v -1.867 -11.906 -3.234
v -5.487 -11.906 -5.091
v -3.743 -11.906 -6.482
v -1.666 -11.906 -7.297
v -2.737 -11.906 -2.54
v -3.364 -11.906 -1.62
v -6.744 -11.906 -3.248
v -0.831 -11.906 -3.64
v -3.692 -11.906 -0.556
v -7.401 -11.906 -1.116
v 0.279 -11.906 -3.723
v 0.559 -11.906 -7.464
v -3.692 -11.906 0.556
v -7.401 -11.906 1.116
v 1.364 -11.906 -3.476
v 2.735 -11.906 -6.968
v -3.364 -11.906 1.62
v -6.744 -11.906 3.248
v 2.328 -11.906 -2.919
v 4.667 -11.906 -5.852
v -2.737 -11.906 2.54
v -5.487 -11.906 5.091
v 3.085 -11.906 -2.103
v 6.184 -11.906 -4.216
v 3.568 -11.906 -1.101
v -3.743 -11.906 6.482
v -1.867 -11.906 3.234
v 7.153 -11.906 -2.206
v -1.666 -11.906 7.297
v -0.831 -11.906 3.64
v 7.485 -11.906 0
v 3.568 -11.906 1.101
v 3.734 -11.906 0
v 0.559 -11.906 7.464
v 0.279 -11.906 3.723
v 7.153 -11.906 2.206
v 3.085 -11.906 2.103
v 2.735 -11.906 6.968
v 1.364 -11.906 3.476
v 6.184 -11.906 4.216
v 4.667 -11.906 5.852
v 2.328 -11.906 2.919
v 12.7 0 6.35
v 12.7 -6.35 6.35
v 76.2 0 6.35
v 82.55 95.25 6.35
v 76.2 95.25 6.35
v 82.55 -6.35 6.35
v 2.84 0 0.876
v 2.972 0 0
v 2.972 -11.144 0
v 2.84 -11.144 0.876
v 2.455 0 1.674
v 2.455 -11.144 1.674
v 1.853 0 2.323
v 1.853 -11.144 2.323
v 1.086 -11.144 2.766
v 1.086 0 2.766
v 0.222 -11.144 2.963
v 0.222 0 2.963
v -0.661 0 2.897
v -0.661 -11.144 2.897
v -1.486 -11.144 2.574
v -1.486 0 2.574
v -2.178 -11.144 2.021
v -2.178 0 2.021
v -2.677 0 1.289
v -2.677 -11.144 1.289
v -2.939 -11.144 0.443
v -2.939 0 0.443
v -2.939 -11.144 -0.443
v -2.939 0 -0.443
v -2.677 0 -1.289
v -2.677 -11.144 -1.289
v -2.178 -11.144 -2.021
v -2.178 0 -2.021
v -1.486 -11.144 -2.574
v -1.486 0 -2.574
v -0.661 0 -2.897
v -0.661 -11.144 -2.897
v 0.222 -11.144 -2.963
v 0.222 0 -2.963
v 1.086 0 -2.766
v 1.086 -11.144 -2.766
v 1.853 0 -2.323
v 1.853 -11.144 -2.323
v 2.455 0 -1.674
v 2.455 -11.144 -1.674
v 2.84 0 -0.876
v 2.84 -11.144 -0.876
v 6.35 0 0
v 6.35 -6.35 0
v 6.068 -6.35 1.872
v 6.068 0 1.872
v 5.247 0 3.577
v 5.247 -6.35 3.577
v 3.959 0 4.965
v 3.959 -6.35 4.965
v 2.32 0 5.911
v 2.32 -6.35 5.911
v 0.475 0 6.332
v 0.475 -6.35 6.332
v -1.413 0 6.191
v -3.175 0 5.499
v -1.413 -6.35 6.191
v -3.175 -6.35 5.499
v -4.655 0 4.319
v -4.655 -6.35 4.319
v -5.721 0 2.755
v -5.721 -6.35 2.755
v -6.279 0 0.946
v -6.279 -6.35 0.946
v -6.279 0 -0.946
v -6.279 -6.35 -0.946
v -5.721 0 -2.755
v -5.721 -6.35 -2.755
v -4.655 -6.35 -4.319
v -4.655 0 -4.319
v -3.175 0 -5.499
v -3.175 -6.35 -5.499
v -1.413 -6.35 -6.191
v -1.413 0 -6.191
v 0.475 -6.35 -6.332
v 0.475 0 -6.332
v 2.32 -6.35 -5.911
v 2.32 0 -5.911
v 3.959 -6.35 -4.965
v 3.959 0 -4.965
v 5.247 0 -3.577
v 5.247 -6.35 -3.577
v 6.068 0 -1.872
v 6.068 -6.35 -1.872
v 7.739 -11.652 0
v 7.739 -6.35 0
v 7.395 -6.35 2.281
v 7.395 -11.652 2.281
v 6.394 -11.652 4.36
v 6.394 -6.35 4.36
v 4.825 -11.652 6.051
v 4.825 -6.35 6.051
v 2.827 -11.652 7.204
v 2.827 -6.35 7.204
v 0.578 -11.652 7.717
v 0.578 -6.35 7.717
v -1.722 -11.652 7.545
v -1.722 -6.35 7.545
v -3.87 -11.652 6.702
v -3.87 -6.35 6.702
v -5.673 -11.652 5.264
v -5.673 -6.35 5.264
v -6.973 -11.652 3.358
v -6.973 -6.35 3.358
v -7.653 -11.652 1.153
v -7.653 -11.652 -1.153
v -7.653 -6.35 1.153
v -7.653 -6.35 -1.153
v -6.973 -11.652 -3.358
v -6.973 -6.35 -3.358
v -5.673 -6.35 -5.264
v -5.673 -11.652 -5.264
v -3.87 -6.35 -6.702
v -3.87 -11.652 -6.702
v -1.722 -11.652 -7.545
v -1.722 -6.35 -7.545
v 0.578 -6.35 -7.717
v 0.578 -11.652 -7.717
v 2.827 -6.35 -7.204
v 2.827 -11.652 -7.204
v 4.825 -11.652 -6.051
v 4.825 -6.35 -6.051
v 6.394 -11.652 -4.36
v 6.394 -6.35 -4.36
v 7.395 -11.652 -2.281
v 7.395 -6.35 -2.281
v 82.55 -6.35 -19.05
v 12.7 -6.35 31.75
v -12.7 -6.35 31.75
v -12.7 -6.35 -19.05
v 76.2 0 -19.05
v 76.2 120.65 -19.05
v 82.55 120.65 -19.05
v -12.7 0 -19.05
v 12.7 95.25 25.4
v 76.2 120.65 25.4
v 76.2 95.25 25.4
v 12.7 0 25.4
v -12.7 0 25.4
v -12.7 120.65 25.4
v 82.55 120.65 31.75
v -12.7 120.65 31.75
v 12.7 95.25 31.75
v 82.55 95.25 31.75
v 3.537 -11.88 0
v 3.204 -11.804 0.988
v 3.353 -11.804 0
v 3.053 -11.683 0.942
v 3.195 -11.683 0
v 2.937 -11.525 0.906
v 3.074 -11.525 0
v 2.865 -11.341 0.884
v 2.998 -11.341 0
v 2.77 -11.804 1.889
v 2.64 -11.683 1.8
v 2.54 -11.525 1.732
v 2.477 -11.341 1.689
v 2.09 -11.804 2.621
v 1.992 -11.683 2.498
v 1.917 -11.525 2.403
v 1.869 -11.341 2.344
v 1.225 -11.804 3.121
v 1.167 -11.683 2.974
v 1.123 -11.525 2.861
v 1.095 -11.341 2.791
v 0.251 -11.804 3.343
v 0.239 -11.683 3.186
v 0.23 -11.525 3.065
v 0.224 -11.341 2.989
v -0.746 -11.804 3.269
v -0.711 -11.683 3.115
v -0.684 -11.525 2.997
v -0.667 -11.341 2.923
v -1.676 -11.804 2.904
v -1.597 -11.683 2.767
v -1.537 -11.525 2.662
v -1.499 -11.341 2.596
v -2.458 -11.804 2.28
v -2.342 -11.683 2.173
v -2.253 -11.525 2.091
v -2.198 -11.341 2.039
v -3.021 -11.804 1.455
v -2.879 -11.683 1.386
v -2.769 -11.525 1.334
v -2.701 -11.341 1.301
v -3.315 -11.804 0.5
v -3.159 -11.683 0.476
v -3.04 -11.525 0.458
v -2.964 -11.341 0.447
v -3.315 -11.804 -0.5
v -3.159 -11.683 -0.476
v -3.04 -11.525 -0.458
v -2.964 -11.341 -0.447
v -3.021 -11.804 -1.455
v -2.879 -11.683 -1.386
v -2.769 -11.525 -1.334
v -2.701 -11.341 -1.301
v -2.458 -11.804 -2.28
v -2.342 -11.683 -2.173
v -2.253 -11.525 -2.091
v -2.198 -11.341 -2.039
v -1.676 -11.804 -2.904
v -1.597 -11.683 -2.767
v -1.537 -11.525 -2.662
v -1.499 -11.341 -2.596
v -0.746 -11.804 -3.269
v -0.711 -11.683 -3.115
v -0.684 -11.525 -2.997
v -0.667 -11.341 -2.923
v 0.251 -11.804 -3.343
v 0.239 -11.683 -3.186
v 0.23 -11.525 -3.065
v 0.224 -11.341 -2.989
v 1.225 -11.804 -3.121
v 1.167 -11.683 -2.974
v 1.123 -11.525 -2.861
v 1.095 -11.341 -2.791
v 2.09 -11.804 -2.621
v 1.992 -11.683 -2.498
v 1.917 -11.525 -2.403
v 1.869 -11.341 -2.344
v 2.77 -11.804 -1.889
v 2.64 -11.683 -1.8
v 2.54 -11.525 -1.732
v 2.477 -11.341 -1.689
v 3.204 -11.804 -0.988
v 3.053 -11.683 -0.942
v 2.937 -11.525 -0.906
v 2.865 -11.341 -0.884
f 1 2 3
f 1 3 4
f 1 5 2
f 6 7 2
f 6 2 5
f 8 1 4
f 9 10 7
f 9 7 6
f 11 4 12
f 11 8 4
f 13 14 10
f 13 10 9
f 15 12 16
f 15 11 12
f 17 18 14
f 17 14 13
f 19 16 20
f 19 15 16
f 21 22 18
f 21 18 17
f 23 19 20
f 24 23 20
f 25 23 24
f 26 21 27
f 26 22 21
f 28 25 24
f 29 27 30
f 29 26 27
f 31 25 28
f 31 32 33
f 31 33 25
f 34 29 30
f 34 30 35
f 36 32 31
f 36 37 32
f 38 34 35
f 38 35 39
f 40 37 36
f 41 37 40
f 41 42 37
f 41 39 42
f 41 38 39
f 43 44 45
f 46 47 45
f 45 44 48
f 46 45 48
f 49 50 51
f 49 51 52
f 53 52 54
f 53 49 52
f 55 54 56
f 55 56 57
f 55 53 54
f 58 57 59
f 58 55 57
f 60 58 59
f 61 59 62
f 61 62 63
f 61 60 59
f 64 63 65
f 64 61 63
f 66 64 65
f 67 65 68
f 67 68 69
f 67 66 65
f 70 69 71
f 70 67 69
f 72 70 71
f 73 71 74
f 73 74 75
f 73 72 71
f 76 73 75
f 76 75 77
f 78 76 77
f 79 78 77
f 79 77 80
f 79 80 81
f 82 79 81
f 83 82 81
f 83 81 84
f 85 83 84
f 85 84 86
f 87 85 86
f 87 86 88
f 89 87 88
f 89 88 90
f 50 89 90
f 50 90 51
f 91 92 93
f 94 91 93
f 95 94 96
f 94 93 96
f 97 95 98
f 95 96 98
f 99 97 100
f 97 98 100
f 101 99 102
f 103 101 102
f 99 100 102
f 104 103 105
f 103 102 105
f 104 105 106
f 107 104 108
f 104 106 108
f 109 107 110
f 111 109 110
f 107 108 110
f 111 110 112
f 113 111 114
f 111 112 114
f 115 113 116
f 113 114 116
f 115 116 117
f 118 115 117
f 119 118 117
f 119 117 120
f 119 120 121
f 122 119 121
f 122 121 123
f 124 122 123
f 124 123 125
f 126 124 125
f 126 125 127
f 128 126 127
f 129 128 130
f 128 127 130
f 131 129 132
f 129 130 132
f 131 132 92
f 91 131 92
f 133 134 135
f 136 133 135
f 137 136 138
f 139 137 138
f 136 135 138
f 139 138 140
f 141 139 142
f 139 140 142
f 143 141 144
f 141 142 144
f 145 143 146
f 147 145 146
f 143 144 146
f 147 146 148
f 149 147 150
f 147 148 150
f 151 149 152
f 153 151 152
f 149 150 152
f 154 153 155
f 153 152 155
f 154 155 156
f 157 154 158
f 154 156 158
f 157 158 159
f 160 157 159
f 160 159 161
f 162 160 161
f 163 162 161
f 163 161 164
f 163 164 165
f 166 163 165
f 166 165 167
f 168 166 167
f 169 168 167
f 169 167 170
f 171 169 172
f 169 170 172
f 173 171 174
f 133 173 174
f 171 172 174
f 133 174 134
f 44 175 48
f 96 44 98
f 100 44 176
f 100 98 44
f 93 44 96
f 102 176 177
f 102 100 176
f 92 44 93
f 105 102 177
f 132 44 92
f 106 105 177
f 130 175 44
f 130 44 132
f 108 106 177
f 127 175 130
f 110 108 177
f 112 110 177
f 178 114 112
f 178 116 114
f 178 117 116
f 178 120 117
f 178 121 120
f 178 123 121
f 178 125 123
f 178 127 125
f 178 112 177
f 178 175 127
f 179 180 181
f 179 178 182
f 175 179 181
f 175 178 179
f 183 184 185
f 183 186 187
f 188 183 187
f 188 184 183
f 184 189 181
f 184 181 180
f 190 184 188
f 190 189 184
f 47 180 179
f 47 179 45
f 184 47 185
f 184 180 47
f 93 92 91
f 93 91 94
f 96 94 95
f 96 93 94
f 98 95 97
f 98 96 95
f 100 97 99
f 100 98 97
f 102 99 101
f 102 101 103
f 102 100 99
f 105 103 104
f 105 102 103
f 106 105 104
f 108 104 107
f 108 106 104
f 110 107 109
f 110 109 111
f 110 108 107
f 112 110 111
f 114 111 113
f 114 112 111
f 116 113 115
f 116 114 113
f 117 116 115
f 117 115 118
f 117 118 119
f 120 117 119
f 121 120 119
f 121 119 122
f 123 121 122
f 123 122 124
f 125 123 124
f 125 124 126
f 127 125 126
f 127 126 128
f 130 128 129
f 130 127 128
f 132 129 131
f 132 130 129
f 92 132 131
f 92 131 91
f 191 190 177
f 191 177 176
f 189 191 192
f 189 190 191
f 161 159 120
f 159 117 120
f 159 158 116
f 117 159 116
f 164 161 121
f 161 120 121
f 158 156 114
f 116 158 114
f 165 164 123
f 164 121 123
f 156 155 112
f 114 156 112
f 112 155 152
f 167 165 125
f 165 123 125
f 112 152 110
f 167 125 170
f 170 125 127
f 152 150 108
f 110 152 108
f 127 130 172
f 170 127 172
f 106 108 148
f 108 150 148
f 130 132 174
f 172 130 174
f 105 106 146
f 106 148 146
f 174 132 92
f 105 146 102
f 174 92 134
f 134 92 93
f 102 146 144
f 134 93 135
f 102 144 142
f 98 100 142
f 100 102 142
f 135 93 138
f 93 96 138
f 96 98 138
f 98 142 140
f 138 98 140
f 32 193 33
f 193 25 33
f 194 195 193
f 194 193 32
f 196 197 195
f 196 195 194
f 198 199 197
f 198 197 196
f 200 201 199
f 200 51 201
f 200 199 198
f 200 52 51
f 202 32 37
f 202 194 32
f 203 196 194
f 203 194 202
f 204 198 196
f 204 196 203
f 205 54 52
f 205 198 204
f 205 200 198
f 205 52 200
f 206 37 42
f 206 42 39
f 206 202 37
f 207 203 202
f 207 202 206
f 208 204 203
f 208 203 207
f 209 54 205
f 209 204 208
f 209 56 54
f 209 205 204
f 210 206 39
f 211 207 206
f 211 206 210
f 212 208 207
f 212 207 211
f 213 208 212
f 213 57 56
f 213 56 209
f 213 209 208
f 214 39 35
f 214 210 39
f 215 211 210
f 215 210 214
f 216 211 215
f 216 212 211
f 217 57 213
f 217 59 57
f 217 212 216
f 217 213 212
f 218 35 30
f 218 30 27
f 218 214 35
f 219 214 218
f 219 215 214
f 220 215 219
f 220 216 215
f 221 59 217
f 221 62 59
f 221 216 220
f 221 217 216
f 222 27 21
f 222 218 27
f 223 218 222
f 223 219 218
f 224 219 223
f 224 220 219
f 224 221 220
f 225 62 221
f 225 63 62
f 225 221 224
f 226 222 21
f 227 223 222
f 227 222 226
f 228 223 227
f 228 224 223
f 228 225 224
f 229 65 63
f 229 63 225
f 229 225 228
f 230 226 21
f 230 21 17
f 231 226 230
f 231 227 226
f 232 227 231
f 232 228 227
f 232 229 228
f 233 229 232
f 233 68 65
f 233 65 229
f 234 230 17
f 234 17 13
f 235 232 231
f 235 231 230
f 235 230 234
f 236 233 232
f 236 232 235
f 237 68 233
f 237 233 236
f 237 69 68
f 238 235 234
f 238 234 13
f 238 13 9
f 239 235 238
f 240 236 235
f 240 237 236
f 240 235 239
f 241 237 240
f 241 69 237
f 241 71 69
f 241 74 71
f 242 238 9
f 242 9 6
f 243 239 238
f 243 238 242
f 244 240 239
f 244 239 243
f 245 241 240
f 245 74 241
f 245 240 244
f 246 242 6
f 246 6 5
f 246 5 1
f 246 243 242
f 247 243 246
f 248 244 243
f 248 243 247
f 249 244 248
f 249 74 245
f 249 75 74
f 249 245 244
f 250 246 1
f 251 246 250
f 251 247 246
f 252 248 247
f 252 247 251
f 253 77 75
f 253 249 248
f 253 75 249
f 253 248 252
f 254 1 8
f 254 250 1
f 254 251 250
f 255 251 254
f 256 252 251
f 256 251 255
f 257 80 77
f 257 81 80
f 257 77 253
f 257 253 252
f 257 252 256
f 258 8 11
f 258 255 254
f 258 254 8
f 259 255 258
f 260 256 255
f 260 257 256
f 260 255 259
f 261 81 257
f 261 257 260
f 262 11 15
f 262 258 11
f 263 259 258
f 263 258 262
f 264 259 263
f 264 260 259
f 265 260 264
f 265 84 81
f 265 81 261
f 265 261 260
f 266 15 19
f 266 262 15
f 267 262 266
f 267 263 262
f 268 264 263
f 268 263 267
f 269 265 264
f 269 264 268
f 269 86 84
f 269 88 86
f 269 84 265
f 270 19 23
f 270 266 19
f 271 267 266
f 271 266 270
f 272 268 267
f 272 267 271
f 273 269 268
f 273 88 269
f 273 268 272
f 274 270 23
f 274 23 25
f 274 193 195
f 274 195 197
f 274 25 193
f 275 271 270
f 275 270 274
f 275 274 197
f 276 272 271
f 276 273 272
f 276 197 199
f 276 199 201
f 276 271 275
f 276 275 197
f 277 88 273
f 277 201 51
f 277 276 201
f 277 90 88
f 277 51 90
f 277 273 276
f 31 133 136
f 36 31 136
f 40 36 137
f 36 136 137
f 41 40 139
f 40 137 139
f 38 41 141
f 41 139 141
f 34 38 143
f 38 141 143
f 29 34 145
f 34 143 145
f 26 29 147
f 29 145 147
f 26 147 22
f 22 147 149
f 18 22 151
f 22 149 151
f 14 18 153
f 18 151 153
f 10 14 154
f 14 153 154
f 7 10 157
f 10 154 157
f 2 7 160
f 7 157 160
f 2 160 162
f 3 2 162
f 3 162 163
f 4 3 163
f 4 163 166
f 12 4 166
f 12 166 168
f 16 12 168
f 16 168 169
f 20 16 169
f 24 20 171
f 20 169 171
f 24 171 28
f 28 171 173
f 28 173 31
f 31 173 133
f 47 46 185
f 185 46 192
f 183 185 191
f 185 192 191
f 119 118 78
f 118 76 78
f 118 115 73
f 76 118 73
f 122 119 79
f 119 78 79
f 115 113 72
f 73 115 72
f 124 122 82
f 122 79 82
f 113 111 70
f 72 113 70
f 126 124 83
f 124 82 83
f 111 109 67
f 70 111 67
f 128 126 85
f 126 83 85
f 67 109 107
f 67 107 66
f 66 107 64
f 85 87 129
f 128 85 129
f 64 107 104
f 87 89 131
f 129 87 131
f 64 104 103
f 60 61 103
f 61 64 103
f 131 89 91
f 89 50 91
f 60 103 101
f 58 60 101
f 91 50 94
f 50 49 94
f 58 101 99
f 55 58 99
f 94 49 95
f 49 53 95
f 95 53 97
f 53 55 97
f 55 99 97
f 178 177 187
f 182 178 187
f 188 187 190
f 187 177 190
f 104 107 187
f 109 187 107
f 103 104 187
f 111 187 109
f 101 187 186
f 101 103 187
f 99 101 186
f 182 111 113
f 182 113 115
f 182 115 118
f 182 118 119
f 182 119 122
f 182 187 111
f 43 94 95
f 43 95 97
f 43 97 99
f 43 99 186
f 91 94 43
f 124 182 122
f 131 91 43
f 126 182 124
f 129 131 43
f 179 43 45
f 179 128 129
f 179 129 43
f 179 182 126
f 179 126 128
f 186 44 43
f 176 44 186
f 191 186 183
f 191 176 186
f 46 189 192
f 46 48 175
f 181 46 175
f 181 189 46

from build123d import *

# Parameters (mm, degrees)
F1_DEPTH      = 12.7
F1_DEPTH_BACK = 12.7
F3_DEPTH      = 25.4
F5_DEPTH      = 25.4
F6_R          = 6.35
F7_DEPTH      = 6.35
F8_R          = 6.35
F8_R_2        = 2.9718
F9_DEPTH      = 6.35
F10_R         = 7.7390625
F10_R_2       = 2.9718
F11_DEPTH     = 5.55625
F12_R         = 0.762
F13_SIZE      = 0.254


with BuildPart() as f1:
    # F0 (on Right) → F1 (new body, two sides)
    with BuildSketch(Plane.YZ) as f1_sk:
        Polygon((120.65, 25.4), (120.65, 31.75), (-6.35, 31.75), (-6.35, -19.05), (0, -19.05), (0, 25.4), align=None)
    extrude(amount=F1_DEPTH)
    extrude(f1_sk.sketch, amount=-F1_DEPTH_BACK)

    # F2 (on face) → F3 (join)
    with BuildSketch(Plane(origin=(0, 0, -19.05), x_dir=(1, 0, 0), z_dir=(0, 0, -1))):
        Polygon((12.7, 6.35), (12.7, 0), (76.2, 0), (76.2, -120.65), (82.55, -120.65), (82.55, 6.35), align=None)
    extrude(amount=-F3_DEPTH)

    # F4 (on face) → F5 (join)
    with BuildSketch(Plane(origin=(0, 120.65, 0), x_dir=(-1, 0, 0), z_dir=(0, 1, 0))):
        Polygon((-12.7, 25.4), (-12.7, 31.75), (-82.55, 31.75), (-82.55, 6.35), (-76.2, 6.35), (-76.2, 25.4), align=None)
    extrude(amount=-F5_DEPTH)

    # F6 (on face) → F7 (cut, through all)
    with BuildSketch(Plane.XZ.offset(6.35)):
        Circle(F6_R)
    extrude(amount=-F7_DEPTH, mode=Mode.SUBTRACT)


with BuildPart() as f9:
    # F8 (on face) → F9 (new body)
    with BuildSketch(Plane.XZ.offset(6.35)):
        Circle(F8_R)
        Circle(F8_R_2, mode=Mode.SUBTRACT)
    extrude(amount=-F9_DEPTH)

    # F10 (on face) → F11 (join)
    with BuildSketch(Plane.XZ.offset(6.35)):
        Circle(F10_R)
        Circle(F10_R_2, mode=Mode.SUBTRACT)
    extrude(amount=F11_DEPTH)

    # F12
    f12_edges = [f9.edges().sort_by_distance(p)[0] for p in [
        (-2.9718, -11.90625, 0),
    ]]
    fillet(f12_edges, radius=F12_R)

    # F13
    f13_edges = [f9.edges().sort_by_distance(p)[0] for p in [
        (-7.739063, -11.90625, 0),
    ]]
    chamfer(f13_edges, length=F13_SIZE)


solid = Compound([f1.part, f9.part])
